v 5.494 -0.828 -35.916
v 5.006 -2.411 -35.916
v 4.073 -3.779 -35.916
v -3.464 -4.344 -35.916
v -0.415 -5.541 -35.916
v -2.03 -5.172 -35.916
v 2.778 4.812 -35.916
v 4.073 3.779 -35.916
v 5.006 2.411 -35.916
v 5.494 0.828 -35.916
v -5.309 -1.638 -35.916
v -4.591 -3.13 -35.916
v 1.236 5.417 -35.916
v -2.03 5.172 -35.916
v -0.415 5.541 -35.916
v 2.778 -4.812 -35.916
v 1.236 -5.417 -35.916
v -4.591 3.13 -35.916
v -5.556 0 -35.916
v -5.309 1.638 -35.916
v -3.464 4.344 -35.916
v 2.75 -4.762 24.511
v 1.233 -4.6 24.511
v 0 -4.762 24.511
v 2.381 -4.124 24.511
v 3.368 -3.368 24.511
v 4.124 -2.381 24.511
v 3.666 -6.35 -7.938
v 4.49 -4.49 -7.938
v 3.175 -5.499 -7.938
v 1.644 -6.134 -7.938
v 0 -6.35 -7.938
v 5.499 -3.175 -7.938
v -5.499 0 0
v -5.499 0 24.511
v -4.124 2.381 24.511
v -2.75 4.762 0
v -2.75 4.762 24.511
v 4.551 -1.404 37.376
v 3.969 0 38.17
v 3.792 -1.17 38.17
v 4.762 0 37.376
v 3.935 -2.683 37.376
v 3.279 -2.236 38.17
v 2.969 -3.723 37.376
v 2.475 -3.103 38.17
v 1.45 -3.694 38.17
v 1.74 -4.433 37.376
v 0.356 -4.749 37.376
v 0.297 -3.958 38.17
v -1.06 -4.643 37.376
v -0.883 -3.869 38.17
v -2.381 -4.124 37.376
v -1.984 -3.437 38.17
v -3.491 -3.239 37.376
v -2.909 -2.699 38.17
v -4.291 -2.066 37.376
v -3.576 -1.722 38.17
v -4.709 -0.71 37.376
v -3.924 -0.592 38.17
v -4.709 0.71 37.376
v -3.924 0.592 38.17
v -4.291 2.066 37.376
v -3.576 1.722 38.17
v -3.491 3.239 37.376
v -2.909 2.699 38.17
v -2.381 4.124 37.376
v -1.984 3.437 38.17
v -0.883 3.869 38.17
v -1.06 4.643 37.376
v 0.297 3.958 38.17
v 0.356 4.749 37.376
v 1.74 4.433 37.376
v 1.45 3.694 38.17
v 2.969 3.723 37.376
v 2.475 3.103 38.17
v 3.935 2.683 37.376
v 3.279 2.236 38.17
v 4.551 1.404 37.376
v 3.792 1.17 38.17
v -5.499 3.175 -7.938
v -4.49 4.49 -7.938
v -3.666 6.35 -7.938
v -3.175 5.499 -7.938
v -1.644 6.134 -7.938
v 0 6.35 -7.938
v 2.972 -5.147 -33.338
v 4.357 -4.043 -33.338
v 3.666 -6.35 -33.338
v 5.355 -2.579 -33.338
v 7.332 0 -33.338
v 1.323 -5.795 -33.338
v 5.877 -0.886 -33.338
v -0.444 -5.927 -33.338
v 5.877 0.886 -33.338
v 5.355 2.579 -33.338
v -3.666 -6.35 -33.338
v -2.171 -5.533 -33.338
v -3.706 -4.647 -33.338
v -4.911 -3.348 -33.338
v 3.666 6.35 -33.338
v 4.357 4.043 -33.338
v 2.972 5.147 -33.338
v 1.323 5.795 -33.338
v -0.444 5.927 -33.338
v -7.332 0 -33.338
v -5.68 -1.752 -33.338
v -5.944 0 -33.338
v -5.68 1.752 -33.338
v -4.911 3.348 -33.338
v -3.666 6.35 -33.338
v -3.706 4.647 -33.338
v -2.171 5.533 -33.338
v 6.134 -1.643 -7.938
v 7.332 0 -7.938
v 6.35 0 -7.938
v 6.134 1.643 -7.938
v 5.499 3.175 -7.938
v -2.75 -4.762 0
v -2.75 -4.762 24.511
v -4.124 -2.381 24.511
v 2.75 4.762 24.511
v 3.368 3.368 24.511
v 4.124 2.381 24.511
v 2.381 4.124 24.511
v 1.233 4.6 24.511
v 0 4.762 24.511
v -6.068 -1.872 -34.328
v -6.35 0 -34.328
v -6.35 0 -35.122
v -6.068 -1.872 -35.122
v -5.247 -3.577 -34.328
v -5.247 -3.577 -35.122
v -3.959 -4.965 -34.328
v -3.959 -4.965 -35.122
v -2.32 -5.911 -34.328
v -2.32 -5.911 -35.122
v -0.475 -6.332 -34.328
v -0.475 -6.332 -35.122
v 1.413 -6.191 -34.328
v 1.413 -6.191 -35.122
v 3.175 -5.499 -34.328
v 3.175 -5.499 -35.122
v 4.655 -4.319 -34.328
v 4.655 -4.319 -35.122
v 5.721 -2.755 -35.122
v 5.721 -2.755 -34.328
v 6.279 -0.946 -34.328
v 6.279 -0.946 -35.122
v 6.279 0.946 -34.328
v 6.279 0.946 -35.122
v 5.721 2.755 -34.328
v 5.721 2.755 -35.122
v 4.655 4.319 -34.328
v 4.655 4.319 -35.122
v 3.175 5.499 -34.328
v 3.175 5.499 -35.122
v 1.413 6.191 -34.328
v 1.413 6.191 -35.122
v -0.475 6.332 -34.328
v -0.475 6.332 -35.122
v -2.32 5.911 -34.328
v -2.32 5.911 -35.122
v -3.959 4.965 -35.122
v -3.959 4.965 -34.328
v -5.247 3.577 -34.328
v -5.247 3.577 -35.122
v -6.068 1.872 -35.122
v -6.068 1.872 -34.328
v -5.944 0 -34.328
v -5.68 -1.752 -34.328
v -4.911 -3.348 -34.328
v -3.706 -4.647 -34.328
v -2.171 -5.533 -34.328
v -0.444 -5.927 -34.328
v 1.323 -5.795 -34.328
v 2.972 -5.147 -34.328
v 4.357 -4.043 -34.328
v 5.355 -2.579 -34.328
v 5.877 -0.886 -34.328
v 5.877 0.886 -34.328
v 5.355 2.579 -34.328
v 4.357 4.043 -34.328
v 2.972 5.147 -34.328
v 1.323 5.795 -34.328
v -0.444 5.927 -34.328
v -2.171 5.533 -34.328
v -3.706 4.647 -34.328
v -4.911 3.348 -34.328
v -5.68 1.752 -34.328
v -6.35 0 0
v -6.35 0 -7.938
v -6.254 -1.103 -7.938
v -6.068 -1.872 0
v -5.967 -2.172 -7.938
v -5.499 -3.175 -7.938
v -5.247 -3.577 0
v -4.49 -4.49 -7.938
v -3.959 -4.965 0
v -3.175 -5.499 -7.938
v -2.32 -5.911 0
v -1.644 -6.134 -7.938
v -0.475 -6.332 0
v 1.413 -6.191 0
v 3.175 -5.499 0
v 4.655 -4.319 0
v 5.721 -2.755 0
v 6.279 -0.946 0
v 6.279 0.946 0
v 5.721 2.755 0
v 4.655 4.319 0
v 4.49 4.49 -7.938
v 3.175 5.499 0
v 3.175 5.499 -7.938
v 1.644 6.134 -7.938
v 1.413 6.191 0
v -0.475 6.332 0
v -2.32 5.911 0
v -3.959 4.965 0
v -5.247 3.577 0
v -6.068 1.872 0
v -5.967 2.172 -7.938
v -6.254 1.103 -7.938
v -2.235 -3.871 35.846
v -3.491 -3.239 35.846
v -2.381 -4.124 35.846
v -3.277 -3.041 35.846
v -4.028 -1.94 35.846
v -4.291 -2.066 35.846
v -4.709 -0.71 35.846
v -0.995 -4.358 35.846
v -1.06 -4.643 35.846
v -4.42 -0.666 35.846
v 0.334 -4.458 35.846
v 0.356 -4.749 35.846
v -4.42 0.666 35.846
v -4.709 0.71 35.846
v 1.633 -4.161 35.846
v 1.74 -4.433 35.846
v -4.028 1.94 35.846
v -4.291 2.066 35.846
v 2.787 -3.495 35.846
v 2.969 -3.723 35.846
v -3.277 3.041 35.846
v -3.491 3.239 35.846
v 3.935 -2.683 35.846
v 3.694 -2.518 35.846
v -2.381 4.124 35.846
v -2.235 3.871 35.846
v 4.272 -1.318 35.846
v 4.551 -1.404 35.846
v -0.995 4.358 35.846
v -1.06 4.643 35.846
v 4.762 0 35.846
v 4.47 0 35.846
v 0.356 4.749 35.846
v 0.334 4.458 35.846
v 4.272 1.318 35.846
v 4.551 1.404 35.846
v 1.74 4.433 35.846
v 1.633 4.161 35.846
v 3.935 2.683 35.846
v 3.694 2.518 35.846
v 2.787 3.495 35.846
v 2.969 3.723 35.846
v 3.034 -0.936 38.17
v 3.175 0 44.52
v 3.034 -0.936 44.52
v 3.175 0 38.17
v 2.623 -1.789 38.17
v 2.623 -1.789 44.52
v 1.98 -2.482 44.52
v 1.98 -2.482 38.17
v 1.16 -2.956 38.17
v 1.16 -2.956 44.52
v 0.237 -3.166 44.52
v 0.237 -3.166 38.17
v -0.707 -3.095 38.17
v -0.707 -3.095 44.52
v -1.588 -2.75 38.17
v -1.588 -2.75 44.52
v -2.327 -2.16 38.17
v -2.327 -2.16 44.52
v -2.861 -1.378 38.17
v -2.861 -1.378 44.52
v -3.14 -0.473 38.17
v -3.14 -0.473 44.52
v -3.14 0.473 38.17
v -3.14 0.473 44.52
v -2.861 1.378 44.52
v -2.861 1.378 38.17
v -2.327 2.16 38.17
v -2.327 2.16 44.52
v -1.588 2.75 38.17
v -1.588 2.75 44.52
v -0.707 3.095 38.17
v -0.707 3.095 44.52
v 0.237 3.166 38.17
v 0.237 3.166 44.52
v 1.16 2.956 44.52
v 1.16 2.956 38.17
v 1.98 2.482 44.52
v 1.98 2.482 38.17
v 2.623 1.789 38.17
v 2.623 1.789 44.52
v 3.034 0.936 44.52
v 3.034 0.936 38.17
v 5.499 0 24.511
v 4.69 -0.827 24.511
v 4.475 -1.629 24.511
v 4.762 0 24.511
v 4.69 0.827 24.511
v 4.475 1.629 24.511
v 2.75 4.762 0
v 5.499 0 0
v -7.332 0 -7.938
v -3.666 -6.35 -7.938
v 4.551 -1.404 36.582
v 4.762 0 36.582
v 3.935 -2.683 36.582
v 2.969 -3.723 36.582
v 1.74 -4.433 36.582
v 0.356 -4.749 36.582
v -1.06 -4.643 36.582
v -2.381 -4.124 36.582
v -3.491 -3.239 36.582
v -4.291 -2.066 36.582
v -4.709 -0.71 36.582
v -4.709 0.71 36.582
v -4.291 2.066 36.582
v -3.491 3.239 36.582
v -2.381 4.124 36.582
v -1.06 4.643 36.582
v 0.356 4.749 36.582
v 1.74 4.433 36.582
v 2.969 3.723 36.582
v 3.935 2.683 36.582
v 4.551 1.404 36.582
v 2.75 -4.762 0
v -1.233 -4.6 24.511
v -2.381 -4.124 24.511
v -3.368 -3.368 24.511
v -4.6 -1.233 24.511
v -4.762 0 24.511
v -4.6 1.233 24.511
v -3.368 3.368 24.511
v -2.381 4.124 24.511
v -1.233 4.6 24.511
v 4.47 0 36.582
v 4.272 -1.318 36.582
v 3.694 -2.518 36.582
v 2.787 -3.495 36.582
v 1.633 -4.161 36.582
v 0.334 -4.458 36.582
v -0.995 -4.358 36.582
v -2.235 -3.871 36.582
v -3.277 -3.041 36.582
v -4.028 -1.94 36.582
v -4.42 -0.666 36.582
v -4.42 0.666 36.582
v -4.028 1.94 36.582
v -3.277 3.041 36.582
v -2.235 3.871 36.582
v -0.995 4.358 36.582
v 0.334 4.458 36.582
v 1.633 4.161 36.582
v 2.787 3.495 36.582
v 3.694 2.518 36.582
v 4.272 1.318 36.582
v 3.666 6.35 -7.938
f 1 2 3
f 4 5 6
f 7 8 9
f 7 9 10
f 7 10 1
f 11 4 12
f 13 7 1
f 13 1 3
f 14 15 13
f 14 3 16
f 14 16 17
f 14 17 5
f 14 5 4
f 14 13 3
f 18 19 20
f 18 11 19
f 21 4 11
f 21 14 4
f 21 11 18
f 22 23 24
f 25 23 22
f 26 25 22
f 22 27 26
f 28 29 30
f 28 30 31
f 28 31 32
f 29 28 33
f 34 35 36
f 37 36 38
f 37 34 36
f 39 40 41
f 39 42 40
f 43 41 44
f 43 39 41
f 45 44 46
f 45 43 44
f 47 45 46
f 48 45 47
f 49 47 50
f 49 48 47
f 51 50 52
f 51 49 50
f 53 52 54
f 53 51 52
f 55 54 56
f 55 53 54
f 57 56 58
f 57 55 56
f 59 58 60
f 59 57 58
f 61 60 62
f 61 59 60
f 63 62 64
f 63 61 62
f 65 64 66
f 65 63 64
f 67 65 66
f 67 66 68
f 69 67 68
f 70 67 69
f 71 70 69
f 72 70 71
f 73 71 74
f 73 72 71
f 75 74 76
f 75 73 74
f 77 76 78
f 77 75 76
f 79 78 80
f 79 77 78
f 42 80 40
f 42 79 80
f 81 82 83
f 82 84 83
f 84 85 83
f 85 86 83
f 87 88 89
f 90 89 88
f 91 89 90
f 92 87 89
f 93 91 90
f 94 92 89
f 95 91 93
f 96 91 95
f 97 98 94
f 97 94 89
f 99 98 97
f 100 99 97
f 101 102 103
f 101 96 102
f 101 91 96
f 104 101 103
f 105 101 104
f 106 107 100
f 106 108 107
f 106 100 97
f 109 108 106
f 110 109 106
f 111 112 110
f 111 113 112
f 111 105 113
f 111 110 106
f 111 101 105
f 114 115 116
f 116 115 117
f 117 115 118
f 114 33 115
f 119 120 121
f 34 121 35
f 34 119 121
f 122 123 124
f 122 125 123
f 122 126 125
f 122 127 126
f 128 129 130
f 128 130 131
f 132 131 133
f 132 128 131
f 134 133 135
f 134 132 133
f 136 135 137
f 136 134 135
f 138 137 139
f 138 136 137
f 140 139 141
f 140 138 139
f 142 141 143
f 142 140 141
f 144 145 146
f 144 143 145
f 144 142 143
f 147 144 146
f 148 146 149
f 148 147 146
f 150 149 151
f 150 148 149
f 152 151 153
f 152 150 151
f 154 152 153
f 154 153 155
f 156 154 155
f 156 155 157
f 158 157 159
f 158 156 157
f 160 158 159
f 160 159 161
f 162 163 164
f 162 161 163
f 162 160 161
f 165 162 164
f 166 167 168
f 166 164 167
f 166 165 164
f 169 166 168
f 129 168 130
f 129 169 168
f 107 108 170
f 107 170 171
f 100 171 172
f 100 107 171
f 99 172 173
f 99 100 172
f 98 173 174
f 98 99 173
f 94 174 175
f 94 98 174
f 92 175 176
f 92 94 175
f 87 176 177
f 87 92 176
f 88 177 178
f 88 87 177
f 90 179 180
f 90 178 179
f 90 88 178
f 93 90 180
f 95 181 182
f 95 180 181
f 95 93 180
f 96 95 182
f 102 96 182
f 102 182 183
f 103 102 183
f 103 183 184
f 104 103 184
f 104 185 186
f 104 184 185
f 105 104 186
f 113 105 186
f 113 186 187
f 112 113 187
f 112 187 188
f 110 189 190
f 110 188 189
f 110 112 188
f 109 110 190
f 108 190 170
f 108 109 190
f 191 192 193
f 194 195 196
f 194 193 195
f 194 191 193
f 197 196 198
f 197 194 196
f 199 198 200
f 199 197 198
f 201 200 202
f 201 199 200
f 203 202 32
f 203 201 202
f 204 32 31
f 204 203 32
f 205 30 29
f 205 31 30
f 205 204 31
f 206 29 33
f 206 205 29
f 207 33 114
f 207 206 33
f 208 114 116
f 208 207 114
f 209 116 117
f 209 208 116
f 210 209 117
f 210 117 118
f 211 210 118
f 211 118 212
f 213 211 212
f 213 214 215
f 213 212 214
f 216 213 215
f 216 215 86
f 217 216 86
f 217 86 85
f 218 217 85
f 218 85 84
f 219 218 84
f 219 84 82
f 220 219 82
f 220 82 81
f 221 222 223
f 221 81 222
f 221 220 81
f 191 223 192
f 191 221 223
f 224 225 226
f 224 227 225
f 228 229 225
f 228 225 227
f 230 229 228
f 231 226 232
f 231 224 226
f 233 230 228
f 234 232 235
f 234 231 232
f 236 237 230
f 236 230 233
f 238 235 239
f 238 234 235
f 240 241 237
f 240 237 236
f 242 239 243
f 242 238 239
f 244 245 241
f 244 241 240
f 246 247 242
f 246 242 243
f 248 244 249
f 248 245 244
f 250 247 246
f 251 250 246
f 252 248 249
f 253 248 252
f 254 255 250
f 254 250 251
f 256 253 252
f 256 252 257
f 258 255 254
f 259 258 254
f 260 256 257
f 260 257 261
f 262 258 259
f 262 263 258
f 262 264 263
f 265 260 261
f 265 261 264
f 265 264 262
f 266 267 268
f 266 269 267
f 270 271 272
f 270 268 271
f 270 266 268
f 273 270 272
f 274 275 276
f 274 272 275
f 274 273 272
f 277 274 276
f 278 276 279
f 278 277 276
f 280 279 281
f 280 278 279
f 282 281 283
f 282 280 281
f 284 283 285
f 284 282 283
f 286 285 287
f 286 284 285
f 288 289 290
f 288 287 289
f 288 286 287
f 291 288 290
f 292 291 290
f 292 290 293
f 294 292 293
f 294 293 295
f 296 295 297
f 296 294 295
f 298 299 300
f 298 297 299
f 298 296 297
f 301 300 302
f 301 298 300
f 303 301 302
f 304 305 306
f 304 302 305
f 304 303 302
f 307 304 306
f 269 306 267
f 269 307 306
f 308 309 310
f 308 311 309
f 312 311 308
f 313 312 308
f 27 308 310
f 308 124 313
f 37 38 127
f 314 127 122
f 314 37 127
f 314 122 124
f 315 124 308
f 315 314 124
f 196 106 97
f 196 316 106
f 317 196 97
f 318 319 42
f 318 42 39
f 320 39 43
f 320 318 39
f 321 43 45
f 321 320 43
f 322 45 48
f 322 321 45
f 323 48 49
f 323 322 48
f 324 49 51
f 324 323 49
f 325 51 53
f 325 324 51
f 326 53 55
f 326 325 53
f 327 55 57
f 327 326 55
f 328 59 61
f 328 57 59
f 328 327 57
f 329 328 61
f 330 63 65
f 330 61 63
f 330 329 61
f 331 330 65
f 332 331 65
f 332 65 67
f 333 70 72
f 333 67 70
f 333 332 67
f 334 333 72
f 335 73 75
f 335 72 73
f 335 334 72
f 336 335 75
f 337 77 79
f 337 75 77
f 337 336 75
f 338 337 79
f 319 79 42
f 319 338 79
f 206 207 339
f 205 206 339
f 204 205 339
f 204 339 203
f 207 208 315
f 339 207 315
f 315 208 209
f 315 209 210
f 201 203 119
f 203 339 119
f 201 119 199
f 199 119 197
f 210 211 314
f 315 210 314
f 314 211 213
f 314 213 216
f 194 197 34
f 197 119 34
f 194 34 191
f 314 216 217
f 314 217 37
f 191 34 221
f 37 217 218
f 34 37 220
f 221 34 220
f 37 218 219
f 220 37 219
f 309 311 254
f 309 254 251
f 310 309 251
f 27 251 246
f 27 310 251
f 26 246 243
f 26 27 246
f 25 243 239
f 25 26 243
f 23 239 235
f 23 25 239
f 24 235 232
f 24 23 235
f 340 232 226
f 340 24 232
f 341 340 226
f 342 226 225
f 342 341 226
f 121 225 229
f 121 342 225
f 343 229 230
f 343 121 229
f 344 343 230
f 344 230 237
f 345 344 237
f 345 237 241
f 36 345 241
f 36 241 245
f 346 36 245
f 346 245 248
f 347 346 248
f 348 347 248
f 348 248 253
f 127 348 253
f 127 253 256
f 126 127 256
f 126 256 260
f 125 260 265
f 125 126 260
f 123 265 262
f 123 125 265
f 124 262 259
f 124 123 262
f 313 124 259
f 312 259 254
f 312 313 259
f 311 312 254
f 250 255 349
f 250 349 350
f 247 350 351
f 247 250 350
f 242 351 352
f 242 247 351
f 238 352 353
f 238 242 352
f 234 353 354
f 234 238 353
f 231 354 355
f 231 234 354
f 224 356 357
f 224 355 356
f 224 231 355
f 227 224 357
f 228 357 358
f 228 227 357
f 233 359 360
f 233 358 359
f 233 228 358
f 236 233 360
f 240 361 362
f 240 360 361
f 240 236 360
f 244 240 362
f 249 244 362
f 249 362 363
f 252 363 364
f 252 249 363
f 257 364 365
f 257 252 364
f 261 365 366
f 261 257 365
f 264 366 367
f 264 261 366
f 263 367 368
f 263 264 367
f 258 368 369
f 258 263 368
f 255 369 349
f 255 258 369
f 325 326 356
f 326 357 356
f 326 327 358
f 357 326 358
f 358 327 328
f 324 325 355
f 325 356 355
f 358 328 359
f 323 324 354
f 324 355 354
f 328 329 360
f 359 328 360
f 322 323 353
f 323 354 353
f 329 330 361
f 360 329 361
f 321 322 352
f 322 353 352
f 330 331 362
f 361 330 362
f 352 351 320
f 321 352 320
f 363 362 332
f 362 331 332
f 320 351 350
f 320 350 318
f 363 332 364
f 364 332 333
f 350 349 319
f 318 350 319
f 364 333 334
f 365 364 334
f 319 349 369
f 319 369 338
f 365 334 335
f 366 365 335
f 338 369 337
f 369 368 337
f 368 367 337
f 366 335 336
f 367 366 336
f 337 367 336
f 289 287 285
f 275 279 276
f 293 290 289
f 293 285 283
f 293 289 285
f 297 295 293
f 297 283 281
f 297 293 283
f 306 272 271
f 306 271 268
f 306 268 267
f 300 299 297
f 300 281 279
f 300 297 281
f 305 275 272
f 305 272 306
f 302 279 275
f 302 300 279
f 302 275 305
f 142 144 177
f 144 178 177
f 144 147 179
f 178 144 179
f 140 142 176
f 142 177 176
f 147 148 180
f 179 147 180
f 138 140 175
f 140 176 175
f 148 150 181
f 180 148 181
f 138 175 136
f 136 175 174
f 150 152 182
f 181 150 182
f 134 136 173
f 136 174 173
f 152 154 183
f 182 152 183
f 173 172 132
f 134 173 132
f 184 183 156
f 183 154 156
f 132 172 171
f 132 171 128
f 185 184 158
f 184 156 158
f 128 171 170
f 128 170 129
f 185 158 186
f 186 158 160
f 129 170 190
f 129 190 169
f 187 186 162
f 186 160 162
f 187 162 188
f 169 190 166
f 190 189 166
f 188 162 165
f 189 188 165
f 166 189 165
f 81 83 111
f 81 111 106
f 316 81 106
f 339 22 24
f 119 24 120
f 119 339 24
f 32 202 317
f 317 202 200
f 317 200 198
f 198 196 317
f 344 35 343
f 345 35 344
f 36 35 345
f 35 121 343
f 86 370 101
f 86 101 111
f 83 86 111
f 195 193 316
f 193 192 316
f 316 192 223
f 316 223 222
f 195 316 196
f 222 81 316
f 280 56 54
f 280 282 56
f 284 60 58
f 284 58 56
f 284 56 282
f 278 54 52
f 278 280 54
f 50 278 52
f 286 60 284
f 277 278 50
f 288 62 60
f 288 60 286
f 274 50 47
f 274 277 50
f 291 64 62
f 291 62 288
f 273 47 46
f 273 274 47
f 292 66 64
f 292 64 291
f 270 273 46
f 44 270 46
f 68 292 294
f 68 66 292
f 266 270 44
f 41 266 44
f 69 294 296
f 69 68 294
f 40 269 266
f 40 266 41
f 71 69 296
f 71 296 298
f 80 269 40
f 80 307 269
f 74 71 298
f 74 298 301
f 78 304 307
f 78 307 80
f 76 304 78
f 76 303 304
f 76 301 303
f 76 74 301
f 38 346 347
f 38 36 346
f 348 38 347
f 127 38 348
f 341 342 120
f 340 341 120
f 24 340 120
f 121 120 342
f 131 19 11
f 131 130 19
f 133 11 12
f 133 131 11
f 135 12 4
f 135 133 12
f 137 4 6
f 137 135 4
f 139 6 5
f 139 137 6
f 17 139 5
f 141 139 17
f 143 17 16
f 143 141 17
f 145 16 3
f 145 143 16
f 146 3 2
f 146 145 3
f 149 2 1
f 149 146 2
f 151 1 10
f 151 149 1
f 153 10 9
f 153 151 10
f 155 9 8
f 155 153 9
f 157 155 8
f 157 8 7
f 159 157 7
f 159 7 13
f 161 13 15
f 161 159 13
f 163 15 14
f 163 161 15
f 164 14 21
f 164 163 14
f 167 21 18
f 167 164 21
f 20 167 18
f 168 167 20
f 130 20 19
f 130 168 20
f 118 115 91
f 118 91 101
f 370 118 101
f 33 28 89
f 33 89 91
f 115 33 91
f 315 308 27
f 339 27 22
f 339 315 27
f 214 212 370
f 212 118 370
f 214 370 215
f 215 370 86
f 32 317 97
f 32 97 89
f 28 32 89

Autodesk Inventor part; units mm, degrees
ref_plane "YZ Plane" through (0, 0, 0) normal (1, 0, 0) x (0, 1, 0)
ref_plane "XZ Plane" through (0, 0, 0) normal (0, 1, 0) x (-1, 0, 0)
ref_plane "XY Plane" through (0, 0, 0) normal (0, 0, 1) x (1, 0, 0)
sketch "Sketch1" plane through (0, 0, 0) normal (0, 0, 1) x (1, 0, 0)
  line L0 (-5.4993, 0) -> (-2.7496, 4.7625)
  line L1 (-2.7496, 4.7625) -> (2.7496, 4.7625)
  line L2 (2.7496, 4.7625) -> (5.4993, 0)
  line L3 (5.4993, 0) -> (2.7496, -4.7625)
  line L4 (2.7496, -4.7625) -> (-2.7496, -4.7625)
  line L5 (-2.7496, -4.7625) -> (-5.4993, 0)
  point P0 (0, 0)
  point P1 (0, 0)
  dimension "d58" = 1.5875
  dimension "d59" = 0
  dimension "d0" = 9.525
extrude "3/8 Hex" add sketch "Sketch1" along normal blind 24.511
sketch "Sketch2" plane through (0, 0, 24.511) normal (0, 0, 1) x (1, 0, 0)
  circle A0 centre (0, 0) radius 4.7625
  dimension "d3" = 9.525
extrude "3/8 Round" add sketch "Sketch2" along normal blind 11.3347
sketch "Sketch3" plane through (0, 0, 35.8458) normal (0, 0, 1) x (1, 0, 0)
  circle A0 centre (0, 0) radius 4.7625 projected
  circle A1 centre (0, 0) radius 3.175
  dimension "d6" = 6.35
extrude "1/4 Round" add sketch "Sketch3" along normal blind 8.6741 contours A1
sketch "Sketch7" plane through (0, 0, 0) normal (0, 0, -1) x (-1, 0, 0)
  circle A0 centre (0, 0) radius 6.35
  dimension "d18" = 12.7
extrude "1/2 Round" add sketch "Sketch7" along normal blind 7.9375
sketch "Sketch8" plane through (0, 0, -7.9375) normal (0, 0, -1) x (-1, 0, 0)
  circle A0 centre (0, 0) radius 6.35 projected
  line L0 (-7.3323, 0) -> (-3.6662, 6.35)
  line L1 (-3.6662, 6.35) -> (3.6662, 6.35)
  line L2 (3.6662, 6.35) -> (7.3323, 0)
  line L3 (7.3323, 0) -> (3.6662, -6.35)
  line L4 (3.6662, -6.35) -> (-3.6662, -6.35)
  line L5 (-3.6662, -6.35) -> (-7.3323, 0)
  dimension "d21" = 12.7
extrude "1/2 Hex" add sketch "Sketch8" along normal blind 25.4
sketch "Sketch12" plane through (0, 0, -33.3375) normal (0, 0, -1) x (-1, 0, 0)
  circle A0 centre (0, 0) radius 5.9436
  dimension "d41" = 11.8872
extrude "Spring Clip Groove" add sketch "Sketch12" along normal blind 0.9906
sketch "Sketch13" plane through (0, 0, -34.3281) normal (0, 0, -1) x (-1, 0, 0)
  circle A0 centre (0, 0) radius 5.9436 projected
  circle A1 centre (0, 0) radius 6.35
  dimension "d45" = 12.7
extrude "Spring Clip" add sketch "Sketch13" along normal blind 1.5875 contours A0 | A1
chamfer "Chamfer2" distance 0.7937 angle 45 1 edges at (6.35, 0, -35.9156)
sketch "Sketch14" plane through (0, 0, 35.8458) normal (0, 0, 1) x (1, 0, 0)
  circle A0 centre (0, 0) radius 3.175 projected
  circle A1 centre (0, 0) radius 4.7625 projected
  circle A2 centre (0, 0) radius 4.4704
  dimension "d52" = 8.9408
extrude "3/8 Spring Clip Groove" add sketch "Sketch14" along normal blind 0.7366 contours A2
sketch "Sketch15" plane through (0, 0, 36.5823) normal (0, 0, 1) x (1, 0, 0)
  circle A0 centre (0, 0) radius 3.175 projected
  circle A1 centre (0, 0) radius 4.4704 projected
  circle A2 centre (0, 0) radius 4.7625
  dimension "d56" = 9.525
extrude "3/8 Round 2" add sketch "Sketch15" along normal blind 1.5875 contours A1 | A2
chamfer "Chamfer3" distance 0.7937 angle 45 1 edges at (-4.7625, 0, 38.1698)
properties part number "Primary Shaft"
